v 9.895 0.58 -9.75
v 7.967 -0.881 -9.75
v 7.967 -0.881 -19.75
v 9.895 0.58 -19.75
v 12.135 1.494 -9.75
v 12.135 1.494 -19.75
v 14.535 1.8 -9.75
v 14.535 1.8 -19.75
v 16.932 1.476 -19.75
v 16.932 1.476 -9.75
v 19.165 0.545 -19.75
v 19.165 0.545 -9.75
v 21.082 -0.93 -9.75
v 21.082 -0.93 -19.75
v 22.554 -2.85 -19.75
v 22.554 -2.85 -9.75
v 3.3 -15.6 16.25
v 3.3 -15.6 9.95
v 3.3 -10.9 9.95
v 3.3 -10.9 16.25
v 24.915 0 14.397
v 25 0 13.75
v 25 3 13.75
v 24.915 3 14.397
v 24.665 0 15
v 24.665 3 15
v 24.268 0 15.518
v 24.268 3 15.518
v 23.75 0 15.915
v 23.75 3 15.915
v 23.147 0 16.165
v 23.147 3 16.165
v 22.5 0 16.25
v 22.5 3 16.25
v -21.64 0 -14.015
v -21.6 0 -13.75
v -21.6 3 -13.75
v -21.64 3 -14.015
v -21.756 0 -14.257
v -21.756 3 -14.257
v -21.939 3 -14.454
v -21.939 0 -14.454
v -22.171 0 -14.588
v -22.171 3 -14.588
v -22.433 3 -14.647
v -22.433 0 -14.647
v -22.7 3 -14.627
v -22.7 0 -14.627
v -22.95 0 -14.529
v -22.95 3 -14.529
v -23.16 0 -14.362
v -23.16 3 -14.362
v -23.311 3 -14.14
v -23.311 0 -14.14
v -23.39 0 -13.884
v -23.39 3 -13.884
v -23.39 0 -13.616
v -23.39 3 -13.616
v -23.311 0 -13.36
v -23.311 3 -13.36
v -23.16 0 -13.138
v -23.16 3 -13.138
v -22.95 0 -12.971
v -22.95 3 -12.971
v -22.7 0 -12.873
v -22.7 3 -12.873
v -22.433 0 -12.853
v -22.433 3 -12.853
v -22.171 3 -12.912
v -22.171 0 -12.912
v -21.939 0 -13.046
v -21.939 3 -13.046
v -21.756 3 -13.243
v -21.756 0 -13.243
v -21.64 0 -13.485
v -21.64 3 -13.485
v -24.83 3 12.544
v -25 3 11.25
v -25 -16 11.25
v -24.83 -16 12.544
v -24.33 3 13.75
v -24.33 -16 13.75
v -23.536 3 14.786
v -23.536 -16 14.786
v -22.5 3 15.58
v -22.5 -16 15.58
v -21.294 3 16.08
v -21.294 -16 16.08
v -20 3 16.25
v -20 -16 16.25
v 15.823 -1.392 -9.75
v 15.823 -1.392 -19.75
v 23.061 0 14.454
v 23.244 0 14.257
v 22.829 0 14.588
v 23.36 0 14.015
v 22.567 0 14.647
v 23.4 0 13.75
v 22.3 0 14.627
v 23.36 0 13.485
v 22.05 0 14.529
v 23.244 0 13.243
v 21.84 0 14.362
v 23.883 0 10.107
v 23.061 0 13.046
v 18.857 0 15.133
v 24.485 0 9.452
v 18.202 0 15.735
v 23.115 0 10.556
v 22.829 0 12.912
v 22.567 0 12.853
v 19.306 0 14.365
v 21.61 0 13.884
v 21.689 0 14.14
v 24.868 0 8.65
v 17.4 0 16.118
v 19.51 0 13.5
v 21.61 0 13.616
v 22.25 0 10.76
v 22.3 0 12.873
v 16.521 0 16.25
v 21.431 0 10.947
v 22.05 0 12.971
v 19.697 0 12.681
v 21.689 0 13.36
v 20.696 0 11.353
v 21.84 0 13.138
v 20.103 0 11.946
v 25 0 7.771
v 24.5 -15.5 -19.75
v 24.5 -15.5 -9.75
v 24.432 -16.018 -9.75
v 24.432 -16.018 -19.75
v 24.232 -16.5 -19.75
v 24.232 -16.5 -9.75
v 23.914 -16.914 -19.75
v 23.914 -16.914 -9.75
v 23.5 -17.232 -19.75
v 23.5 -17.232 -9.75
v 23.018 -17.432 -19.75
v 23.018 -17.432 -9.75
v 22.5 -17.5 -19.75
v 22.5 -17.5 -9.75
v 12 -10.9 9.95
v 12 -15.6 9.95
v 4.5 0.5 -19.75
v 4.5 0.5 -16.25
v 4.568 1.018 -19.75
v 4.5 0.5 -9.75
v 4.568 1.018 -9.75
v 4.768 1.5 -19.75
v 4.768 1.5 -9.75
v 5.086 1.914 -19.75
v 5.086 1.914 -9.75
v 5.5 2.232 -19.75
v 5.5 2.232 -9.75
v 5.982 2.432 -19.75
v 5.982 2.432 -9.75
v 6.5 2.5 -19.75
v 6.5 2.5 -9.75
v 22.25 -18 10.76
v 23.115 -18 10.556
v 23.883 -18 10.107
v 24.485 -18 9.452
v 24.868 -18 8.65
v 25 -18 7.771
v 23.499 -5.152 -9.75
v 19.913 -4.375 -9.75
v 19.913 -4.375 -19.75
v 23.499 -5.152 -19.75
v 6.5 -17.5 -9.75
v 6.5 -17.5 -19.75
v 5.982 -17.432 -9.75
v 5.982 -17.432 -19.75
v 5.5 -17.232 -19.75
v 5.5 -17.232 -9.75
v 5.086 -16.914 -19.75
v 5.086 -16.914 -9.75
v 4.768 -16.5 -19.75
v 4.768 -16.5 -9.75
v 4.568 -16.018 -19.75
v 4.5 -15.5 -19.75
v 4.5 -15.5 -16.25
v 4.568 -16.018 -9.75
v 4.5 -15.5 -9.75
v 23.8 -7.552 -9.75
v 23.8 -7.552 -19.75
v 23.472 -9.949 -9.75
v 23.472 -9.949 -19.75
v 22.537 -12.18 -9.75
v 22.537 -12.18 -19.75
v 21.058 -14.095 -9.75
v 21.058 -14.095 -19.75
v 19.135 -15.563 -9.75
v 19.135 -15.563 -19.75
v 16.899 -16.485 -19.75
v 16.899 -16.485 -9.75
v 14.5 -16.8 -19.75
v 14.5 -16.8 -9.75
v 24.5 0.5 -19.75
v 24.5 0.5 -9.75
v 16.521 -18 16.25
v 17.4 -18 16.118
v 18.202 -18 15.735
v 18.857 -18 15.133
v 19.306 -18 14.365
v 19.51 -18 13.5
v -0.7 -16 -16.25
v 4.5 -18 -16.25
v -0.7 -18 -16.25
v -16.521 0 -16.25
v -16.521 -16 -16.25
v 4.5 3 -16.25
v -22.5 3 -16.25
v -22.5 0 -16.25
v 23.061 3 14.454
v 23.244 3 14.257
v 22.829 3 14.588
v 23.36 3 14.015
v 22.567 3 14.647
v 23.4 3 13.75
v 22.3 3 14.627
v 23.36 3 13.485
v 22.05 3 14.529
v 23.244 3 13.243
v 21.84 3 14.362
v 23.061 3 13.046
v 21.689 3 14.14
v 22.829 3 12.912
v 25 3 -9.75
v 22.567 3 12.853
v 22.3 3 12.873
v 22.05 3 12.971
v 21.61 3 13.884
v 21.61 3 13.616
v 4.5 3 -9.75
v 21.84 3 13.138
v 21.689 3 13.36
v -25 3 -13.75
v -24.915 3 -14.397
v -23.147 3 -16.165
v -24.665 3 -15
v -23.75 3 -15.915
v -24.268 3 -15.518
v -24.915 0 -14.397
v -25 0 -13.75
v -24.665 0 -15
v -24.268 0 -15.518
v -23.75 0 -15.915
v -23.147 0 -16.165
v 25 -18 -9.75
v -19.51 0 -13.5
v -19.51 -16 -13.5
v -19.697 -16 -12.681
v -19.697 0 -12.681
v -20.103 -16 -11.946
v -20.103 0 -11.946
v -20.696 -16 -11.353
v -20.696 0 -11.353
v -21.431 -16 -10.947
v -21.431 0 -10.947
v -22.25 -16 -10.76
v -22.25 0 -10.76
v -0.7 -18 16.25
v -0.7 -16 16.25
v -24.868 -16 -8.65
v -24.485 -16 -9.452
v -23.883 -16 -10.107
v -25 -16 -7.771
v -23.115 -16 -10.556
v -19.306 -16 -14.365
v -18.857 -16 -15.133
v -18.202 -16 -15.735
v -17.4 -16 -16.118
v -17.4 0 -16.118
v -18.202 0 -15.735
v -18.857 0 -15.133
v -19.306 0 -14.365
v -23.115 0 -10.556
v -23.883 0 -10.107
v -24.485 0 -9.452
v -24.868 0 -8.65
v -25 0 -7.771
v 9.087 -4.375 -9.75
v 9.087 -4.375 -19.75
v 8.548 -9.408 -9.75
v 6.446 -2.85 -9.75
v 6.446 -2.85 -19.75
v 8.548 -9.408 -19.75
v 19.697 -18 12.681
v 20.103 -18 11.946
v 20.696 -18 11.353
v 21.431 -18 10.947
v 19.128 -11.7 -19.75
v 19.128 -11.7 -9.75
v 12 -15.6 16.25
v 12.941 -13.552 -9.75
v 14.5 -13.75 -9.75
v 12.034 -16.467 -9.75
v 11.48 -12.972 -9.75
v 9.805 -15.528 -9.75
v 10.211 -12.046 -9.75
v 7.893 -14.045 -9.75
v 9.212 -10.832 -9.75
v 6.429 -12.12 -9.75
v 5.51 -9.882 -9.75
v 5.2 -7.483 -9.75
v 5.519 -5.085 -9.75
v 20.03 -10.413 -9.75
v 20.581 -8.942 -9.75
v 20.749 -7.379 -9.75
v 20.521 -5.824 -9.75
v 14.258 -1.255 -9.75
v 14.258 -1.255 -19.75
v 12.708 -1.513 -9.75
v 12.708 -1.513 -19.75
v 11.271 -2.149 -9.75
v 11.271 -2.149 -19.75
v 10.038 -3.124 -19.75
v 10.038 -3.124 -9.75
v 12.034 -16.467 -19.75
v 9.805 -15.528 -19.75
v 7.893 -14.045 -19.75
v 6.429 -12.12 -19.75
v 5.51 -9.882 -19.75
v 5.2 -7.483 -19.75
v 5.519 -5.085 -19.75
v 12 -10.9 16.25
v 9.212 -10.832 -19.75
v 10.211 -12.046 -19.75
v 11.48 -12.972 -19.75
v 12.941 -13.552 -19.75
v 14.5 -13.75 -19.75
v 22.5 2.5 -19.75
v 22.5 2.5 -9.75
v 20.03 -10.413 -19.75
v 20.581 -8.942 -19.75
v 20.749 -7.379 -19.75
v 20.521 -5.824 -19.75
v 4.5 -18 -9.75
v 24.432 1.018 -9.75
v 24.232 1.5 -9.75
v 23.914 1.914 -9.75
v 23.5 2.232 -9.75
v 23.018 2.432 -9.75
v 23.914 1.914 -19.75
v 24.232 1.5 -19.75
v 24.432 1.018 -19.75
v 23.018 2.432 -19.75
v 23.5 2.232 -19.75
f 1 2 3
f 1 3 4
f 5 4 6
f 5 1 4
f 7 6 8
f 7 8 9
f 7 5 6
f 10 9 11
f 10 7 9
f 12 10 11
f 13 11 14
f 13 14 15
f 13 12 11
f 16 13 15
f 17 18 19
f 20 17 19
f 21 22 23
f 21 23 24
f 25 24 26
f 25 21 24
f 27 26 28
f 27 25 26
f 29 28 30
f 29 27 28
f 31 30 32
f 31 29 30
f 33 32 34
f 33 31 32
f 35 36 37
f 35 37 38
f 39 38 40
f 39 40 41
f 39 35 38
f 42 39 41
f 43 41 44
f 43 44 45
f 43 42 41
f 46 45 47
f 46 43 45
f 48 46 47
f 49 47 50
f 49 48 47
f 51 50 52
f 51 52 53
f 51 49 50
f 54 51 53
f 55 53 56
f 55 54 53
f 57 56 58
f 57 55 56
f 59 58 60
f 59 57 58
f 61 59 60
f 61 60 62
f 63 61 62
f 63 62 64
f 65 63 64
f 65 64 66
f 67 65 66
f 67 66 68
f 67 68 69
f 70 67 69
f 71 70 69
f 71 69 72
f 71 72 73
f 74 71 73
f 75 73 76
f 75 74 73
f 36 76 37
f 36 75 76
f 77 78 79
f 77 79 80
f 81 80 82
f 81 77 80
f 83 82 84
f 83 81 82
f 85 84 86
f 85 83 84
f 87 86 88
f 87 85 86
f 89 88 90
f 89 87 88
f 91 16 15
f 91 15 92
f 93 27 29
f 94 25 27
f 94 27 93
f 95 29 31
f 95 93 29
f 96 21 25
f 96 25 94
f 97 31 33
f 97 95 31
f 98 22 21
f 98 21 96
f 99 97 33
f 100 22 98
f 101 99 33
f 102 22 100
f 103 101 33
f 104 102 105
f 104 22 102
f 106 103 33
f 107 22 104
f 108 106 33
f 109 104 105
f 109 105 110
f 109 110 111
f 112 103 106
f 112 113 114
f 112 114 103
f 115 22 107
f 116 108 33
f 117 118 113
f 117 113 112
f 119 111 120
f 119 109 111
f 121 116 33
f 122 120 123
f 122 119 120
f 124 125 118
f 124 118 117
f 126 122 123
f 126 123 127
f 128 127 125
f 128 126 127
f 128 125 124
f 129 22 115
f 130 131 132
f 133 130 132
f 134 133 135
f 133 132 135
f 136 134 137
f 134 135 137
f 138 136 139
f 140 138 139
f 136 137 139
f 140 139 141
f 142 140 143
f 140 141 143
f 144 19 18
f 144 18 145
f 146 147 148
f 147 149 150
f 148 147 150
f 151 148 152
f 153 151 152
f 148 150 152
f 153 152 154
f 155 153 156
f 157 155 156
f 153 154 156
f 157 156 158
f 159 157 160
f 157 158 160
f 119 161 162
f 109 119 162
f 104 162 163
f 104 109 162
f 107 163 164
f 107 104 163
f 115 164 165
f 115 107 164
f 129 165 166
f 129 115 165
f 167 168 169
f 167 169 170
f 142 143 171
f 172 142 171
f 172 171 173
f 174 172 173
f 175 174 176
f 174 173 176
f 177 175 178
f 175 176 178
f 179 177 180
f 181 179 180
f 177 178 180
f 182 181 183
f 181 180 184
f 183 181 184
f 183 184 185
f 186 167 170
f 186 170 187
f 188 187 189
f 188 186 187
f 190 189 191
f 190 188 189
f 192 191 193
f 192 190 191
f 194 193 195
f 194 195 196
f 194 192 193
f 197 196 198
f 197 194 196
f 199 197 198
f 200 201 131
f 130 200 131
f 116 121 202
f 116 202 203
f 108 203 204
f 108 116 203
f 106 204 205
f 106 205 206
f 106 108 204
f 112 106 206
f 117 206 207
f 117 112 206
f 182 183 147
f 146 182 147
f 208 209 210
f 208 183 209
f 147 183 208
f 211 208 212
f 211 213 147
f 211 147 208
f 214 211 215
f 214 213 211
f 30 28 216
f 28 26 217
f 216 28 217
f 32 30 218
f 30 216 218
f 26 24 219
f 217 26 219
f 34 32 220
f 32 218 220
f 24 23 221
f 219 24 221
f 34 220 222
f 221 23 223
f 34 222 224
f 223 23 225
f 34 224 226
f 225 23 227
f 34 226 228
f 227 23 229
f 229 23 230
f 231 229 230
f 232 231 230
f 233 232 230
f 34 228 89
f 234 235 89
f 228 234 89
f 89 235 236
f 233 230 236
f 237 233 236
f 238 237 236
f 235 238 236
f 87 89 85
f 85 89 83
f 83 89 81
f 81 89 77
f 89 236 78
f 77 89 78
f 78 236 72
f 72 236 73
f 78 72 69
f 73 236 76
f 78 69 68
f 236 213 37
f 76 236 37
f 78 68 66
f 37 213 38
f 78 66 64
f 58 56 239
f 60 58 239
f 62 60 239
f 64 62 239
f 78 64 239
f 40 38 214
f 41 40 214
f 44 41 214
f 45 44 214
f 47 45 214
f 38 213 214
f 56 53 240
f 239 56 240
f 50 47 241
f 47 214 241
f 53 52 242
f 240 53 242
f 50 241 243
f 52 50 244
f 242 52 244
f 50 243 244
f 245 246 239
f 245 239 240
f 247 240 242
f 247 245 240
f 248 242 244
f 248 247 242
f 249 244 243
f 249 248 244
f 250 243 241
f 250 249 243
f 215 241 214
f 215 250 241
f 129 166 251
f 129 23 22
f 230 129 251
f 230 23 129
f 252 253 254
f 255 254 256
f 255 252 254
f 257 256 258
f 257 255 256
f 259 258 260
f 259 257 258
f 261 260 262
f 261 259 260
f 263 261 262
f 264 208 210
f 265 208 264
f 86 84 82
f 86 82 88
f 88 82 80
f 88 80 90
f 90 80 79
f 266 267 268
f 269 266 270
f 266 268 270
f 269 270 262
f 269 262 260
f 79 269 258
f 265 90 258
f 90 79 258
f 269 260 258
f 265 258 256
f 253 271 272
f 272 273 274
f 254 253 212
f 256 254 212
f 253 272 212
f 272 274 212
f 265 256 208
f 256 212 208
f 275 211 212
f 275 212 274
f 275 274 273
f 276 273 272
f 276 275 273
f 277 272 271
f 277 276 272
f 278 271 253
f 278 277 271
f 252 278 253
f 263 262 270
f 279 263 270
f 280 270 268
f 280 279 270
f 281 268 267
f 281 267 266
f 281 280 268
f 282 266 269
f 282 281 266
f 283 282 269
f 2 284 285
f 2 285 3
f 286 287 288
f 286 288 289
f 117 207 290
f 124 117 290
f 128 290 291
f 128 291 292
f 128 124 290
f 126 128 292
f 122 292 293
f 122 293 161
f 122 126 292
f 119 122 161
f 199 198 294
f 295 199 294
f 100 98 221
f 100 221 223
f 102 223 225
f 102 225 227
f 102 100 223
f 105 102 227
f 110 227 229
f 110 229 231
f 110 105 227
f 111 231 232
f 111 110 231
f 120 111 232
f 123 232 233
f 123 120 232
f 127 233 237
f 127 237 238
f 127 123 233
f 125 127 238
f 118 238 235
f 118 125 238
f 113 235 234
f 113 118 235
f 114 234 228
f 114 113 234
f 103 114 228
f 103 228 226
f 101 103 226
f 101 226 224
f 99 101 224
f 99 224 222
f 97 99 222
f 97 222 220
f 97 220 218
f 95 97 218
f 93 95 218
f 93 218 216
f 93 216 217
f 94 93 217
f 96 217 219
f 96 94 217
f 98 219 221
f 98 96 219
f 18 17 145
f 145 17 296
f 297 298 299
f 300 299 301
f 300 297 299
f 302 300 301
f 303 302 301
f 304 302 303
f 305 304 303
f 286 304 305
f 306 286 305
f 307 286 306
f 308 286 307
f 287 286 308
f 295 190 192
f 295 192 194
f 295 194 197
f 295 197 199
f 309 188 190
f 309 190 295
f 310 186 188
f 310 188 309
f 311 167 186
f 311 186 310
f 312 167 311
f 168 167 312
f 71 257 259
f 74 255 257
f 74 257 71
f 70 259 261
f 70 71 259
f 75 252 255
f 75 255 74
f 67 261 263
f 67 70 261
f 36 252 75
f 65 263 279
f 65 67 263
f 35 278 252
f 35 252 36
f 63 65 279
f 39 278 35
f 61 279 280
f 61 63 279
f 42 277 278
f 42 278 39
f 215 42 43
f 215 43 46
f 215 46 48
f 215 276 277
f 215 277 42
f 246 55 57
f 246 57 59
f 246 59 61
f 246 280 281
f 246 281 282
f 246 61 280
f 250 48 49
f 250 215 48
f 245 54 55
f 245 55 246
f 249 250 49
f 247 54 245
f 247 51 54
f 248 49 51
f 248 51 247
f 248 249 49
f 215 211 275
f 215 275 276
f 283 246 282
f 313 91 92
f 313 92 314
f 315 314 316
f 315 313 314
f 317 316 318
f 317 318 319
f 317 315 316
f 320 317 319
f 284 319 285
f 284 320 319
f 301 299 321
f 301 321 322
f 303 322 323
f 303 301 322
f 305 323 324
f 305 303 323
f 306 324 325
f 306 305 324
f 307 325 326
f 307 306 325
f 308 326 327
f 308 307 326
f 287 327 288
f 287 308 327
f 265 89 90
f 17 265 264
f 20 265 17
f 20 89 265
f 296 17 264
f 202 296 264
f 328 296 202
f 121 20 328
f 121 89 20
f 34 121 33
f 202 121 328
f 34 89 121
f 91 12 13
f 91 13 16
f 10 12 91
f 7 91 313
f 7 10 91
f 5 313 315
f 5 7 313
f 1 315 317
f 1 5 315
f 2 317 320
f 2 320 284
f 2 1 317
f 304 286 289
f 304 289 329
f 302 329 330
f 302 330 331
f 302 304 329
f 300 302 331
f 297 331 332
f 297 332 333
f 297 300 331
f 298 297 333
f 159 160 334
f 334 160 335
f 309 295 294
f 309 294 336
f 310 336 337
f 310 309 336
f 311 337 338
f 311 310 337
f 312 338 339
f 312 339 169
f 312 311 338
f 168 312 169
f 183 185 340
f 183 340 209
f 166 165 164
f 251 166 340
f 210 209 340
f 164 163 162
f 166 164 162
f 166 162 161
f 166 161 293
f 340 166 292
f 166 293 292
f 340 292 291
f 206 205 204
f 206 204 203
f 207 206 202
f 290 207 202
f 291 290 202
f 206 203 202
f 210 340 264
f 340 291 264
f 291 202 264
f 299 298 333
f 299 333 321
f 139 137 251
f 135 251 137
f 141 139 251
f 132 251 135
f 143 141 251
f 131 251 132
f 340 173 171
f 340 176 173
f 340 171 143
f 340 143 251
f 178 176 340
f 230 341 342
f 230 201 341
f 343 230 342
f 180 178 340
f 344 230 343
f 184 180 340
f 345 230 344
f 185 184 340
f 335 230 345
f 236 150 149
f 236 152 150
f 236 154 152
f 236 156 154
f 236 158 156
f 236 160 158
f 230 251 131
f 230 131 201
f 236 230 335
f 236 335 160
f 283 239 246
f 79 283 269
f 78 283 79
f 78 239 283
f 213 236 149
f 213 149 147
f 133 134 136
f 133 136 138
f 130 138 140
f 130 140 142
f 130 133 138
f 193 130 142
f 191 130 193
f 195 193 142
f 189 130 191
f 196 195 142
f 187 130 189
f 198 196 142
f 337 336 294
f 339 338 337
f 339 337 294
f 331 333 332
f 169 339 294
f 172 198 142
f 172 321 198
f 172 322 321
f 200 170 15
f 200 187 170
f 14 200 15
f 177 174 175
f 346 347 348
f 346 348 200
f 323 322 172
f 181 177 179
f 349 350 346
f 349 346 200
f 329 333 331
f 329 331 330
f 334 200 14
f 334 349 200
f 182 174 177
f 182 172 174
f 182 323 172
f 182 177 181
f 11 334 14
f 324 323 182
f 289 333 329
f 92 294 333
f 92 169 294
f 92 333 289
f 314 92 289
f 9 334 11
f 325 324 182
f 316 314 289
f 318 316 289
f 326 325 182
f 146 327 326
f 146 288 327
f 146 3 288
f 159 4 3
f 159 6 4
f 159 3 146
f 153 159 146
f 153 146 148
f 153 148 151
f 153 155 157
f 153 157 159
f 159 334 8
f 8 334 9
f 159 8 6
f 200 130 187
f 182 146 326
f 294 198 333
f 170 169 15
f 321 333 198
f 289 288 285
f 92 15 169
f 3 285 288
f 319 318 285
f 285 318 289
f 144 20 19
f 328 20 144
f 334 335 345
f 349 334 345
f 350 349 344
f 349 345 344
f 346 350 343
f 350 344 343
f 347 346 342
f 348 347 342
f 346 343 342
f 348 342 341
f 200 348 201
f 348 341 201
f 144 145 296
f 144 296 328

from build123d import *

# Parameters (mm, degrees)
SKETCH_1_R          = 0.9
EXTRUDE_1_DEPTH     = 3
EXTRUDE_2_DEPTH     = 19
EXTRUDE_3_DEPTH     = 2
SKETCH_5_W          = 8.7
SKETCH_5_H          = 4.7
CUT_EXTRUDE_1_DEPTH = 6.3
EXTRUDE_4_DEPTH     = 10


with BuildPart() as part:
    # 草图1 → 凸台-拉伸1 (new body)
    with BuildSketch(Plane(origin=(0, 0, 0), x_dir=(1, 0, 0), z_dir=(0, 1, 0))):
        with BuildLine():
            Line((4.5, 16.25), (4.5, 9.75))
            Line((4.5, 9.75), (25, 9.75))
            Line((25, 9.75), (25, -13.75))
            ThreePointArc((25, -13.75), (24.267766953, -15.517766953), (22.5, -16.25))
            Line((22.5, -16.25), (-20, -16.25))
            ThreePointArc((-20, -16.25), (-23.535533906, -14.785533906), (-25, -11.25))
            Line((-25, -11.25), (-25, 13.75))
            ThreePointArc((-25, 13.75), (-24.267766953, 15.517766953), (-22.5, 16.25))
            Line((-22.5, 16.25), (4.5, 16.25))
        make_face()
        with Locations((-22.5, 13.75)):
            Circle(SKETCH_1_R, mode=Mode.SUBTRACT)
        with Locations((22.5, -13.75)):
            Circle(SKETCH_1_R, mode=Mode.SUBTRACT)
    extrude(amount=EXTRUDE_1_DEPTH)

    # 草图2 → 凸台-拉伸2 (add)
    with BuildSketch(Plane(origin=(0, 3, 0), x_dir=(1, 0, 0), z_dir=(0, 1, 0))):
        with BuildLine():
            Line((4.5, 16.25), (-16.520869628, 16.25))
            ThreePointArc((-16.520869628, 16.25), (-18.55187923, 15.457940217), (-19.510434814, 13.5))
            ThreePointArc((-19.510434814, 13.5), (-20.378679656, 11.628679656), (-22.25, 10.760434814))
            ThreePointArc((-22.25, 10.760434814), (-24.207940217, 9.80187923), (-25, 7.770869628))
            Line((-25, 7.770869628), (-25, -11.25))
            ThreePointArc((-25, -11.25), (-23.535533906, -14.785533906), (-20, -16.25))
            Line((-20, -16.25), (16.520869628, -16.25))
            ThreePointArc((16.520869628, -16.25), (18.55187923, -15.457940217), (19.510434814, -13.5))
            ThreePointArc((19.510434814, -13.5), (20.378679656, -11.628679656), (22.25, -10.760434814))
            ThreePointArc((22.25, -10.760434814), (24.207940217, -9.80187923), (25, -7.770869628))
            Line((25, -7.770869628), (25, 9.75))
            Line((25, 9.75), (4.5, 9.75))
            Line((4.5, 9.75), (4.5, 16.25))
        make_face()
    extrude(amount=-EXTRUDE_2_DEPTH)

    # 草图4 → 凸台-拉伸3 (add)
    with BuildSketch(Plane.XZ.offset(16)):
        with BuildLine():
            Line((-0.7, -16.25), (-0.7, 16.25))
            Line((-0.7, 16.25), (16.520869628, 16.25))
            ThreePointArc((16.520869628, 16.25), (18.55187923, 15.457940217), (19.510434814, 13.5))
            ThreePointArc((19.510434814, 13.5), (20.378679656, 11.628679656), (22.25, 10.760434814))
            ThreePointArc((22.25, 10.760434814), (24.207940217, 9.80187923), (25, 7.770869628))
            Line((25, 7.770869628), (25, -9.75))
            Line((25, -9.75), (4.5, -9.75))
            Line((4.5, -9.75), (4.5, -16.25))
            Line((4.5, -16.25), (-0.7, -16.25))
        make_face()
    extrude(amount=EXTRUDE_3_DEPTH)

    # 草图5 → 切除-拉伸1 (cut)
    with BuildSketch(Plane.XY.offset(16.25)):
        with Locations((7.65, -13.25)):
            Rectangle(SKETCH_5_W, SKETCH_5_H)
    extrude(amount=-CUT_EXTRUDE_1_DEPTH, mode=Mode.SUBTRACT)

    # 草图6 → 凸台-拉伸4 (add)
    with BuildSketch(Plane(origin=(0, 0, -9.75), x_dir=(-1, 0, 0), z_dir=(0, 0, -1))):
        with BuildLine():
            Line((-6.5, 2.5), (-22.5, 2.5))
            ThreePointArc((-22.5, 2.5), (-23.914213562, 1.914213562), (-24.5, 0.5))
            Line((-24.5, 0.5), (-24.5, -15.5))
            ThreePointArc((-24.5, -15.5), (-23.914213562, -16.914213562), (-22.5, -17.5))
            Line((-22.5, -17.5), (-6.5, -17.5))
            ThreePointArc((-6.5, -17.5), (-5.085786438, -16.914213562), (-4.5, -15.5))
            Line((-4.5, -15.5), (-4.5, 0.5))
            ThreePointArc((-4.5, 0.5), (-5.085786438, 1.914213562), (-6.5, 2.5))
        make_face()
        with BuildLine():
            Line((-14.5, -13.75), (-12.034104017, -16.467126463))
            ThreePointArc((-12.034104017, -16.467126463), (-5.896292843, -11.030753907), (-6.445963745, -2.85))
            Line((-6.445963745, -2.85), (-8.548360144, -9.408004985))
            ThreePointArc((-8.548360144, -9.408004985), (-10.816423691, -12.549135132), (-14.5, -13.75))
        make_face(mode=Mode.SUBTRACT)
        with BuildLine():
            Line((-14.5, -16.8), (-19.128200716, -11.700268817))
            ThreePointArc((-19.128200716, -11.700268817), (-20.714467446, -8.165503094), (-19.912658774, -4.375))
            Line((-19.912658774, -4.375), (-23.498707307, -5.151965333))
            ThreePointArc((-23.498707307, -5.151965333), (-21.859576156, -13.185652012), (-14.5, -16.8))
        make_face(mode=Mode.SUBTRACT)
        with BuildLine():
            Line((-22.554036255, -2.85), (-15.823439141, -1.391726198))
            ThreePointArc((-15.823439141, -1.391726198), (-11.969108863, -1.785361774), (-9.087341226, -4.375))
            Line((-9.087341226, -4.375), (-7.967188676, -0.880908204))
            ThreePointArc((-7.967188676, -0.880908204), (-15.744131001, 1.716405918), (-22.554036255, -2.85))
        make_face(mode=Mode.SUBTRACT)
    extrude(amount=EXTRUDE_4_DEPTH)


solid = part.part
